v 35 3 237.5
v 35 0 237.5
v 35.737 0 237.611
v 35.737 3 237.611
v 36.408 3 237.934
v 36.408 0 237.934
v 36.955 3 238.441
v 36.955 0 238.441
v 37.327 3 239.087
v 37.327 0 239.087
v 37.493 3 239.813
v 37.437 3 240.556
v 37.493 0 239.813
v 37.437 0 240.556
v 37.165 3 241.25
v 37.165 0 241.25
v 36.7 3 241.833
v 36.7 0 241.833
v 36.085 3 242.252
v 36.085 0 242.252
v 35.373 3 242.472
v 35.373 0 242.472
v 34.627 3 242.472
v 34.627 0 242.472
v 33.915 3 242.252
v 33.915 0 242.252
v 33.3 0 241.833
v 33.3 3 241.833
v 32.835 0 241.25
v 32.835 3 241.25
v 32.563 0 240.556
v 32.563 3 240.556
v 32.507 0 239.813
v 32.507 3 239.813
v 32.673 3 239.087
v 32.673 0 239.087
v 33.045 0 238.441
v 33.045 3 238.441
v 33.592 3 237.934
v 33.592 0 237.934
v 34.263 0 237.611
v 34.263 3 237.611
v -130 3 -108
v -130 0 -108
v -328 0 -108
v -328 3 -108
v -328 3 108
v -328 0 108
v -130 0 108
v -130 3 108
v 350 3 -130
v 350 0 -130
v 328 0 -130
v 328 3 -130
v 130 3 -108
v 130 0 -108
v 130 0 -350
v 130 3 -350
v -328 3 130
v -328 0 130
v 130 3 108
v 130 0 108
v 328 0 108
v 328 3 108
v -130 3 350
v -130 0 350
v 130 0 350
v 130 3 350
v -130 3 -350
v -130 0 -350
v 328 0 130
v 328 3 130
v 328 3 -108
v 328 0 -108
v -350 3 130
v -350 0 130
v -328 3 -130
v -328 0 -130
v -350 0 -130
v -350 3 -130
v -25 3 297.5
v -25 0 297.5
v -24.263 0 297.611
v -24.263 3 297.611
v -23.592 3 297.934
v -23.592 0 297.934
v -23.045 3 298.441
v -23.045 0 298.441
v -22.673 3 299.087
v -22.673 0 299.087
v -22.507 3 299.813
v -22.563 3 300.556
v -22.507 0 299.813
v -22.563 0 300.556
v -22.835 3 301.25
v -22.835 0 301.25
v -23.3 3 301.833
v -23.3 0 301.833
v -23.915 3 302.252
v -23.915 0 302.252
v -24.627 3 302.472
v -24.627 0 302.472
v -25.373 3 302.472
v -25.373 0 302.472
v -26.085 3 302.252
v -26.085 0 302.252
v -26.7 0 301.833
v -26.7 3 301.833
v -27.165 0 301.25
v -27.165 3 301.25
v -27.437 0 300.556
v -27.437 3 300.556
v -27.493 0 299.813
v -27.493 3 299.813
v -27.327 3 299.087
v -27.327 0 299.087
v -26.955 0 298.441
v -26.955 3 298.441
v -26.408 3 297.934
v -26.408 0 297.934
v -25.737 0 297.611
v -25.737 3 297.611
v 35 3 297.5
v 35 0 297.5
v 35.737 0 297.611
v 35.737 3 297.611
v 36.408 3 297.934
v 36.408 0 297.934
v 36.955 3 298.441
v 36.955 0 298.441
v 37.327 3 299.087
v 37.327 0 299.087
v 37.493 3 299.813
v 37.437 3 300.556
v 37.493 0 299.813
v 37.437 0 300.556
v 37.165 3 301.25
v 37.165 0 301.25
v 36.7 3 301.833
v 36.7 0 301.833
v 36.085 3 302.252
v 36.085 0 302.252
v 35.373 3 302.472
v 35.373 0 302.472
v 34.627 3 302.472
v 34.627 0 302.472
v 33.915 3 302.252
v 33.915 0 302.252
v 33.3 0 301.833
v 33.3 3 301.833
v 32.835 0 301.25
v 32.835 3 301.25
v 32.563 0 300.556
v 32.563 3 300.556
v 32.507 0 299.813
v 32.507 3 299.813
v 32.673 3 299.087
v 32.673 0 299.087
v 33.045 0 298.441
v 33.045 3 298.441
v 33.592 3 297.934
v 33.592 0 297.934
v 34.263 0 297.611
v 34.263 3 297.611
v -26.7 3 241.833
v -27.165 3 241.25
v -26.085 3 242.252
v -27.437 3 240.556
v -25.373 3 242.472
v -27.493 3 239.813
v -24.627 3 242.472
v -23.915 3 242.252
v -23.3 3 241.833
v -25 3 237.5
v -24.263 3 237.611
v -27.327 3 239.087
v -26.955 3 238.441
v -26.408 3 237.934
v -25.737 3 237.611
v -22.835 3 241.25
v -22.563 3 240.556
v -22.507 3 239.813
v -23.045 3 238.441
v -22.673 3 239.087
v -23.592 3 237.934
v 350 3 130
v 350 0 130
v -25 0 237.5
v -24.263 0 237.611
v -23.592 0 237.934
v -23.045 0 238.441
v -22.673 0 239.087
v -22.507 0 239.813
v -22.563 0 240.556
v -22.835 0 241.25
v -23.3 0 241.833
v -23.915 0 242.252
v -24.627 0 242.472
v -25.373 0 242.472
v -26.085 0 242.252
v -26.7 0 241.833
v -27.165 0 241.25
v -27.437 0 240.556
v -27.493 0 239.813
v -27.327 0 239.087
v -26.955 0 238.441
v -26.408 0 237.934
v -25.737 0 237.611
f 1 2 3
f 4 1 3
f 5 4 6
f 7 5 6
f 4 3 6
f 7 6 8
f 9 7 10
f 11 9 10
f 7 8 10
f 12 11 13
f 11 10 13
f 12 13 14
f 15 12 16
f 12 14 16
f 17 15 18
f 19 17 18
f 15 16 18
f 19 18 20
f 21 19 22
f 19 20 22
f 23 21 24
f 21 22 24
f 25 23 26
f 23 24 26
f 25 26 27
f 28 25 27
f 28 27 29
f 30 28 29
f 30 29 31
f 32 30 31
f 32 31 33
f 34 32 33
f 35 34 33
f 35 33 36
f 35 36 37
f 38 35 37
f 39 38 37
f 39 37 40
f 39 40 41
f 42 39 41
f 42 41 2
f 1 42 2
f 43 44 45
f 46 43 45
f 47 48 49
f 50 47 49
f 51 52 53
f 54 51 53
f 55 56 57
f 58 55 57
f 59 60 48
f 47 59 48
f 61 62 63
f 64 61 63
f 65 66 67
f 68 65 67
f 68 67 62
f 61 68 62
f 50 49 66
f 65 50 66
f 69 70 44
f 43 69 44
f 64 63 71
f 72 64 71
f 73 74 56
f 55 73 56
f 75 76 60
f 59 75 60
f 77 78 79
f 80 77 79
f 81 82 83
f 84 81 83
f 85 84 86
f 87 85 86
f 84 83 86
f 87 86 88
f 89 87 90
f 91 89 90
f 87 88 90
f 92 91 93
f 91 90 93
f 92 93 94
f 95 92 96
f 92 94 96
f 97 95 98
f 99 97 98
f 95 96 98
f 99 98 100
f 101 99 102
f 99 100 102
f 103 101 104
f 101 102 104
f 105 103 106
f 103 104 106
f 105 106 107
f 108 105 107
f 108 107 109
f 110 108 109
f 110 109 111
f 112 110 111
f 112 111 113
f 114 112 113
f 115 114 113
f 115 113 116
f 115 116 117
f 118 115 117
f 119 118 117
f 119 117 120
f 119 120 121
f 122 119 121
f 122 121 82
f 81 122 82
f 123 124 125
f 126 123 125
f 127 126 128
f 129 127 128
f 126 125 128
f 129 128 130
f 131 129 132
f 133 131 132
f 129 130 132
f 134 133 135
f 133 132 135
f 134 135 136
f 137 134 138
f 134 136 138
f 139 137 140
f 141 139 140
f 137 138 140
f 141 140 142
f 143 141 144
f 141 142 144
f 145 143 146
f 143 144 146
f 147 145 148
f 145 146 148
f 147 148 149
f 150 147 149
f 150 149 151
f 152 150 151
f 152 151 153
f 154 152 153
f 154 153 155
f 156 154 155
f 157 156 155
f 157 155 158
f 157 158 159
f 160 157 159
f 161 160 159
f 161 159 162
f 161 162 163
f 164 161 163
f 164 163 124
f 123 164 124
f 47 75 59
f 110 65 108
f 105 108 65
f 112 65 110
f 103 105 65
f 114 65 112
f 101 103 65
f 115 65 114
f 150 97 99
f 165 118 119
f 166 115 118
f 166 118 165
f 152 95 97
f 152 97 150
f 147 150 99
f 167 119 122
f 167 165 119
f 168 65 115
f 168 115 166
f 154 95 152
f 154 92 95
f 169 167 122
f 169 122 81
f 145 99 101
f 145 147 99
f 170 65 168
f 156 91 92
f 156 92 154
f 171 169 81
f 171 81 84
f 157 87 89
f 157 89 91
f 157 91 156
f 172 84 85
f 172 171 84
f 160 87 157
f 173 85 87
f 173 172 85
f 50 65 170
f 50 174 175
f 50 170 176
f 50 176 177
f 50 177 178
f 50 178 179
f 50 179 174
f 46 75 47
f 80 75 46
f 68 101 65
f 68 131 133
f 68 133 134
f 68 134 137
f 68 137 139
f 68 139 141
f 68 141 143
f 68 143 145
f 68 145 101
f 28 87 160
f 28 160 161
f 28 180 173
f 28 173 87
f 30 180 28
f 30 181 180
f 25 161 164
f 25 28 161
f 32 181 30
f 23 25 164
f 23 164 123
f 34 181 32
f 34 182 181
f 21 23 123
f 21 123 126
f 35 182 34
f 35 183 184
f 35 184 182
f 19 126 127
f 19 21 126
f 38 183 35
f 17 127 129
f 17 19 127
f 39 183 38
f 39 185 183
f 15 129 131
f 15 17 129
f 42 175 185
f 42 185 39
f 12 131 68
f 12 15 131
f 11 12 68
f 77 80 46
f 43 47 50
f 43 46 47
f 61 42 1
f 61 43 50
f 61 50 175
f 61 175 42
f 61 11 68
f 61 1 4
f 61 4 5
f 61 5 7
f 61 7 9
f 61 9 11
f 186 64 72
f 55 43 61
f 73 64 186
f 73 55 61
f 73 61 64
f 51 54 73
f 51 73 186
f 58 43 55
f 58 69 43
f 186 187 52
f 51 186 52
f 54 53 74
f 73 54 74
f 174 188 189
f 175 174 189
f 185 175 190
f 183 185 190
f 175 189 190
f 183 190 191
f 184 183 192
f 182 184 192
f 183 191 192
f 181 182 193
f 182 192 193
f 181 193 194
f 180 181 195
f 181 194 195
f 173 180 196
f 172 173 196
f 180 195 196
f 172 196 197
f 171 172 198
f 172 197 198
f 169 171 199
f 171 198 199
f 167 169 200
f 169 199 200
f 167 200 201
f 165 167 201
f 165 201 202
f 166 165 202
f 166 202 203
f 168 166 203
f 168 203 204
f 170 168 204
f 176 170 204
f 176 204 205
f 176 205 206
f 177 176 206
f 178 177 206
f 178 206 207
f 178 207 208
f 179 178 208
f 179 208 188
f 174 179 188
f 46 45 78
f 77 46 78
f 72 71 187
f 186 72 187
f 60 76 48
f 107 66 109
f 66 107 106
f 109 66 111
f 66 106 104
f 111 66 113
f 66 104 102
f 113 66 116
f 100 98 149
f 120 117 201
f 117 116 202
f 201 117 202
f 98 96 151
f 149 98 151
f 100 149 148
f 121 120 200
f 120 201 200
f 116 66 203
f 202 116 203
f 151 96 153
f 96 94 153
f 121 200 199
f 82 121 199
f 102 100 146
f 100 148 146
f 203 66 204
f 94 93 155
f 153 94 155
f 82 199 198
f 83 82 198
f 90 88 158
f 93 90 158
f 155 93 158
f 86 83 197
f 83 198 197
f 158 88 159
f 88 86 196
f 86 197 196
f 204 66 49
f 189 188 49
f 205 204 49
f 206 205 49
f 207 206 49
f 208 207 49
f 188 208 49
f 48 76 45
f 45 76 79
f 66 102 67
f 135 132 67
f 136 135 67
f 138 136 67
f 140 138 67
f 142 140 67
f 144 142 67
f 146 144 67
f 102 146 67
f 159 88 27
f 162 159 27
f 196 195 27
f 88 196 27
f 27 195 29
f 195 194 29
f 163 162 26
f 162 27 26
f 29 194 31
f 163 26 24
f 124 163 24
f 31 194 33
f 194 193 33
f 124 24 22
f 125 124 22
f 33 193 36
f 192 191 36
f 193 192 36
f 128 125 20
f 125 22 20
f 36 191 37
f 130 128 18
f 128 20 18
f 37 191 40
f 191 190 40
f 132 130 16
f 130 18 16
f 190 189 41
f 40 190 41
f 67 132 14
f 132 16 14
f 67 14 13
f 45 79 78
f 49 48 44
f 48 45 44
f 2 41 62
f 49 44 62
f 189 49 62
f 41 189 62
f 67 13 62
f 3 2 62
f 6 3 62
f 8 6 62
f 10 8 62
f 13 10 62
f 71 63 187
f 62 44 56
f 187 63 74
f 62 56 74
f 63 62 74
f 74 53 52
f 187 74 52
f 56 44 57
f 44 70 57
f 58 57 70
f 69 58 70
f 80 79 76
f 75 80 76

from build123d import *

# Parameters (mm, degrees)
BASE_DEPTH         = 3
SKETCH2_R          = 2.5
CUT_EXTRUDE2_DEPTH = 495.98383812


with BuildPart() as part:
    # Sketch1 → Base (new body)
    with BuildSketch(Plane(origin=(0, 0, 0), x_dir=(1, 0, 0), z_dir=(0, 1, 0))):
        Polygon((-350, -130), (-328, -130), (-328, -108), (-130, -108), (-130, -130), (-130, -350), (130, -350), (130, -130), (130, -108), (328, -108), (328, -130), (350, -130), (350, 130), (328, 130), (328, 108), (130, 108), (130, 130), (130, 350), (-130, 350), (-130, 130), (-130, 108), (-328, 108), (-328, 130), (-350, 130), align=None)
    extrude(amount=BASE_DEPTH)

    # Sketch2 → Cut-Extrude2 (cut, through all)
    with BuildSketch(Plane.XZ):
        with Locations(Location((-25, 300, 0), (0, 0, 270))):
            Circle(SKETCH2_R)
        with Locations(Location((35, 300, 0), (0, 0, 270))):
            Circle(SKETCH2_R)
        with Locations(Location((-25, 240, 0), (0, 0, 270))):
            Circle(SKETCH2_R)
        with Locations(Location((35, 240, 0), (0, 0, 270))):
            Circle(SKETCH2_R)
    extrude(amount=-CUT_EXTRUDE2_DEPTH, mode=Mode.SUBTRACT)


solid = part.part
